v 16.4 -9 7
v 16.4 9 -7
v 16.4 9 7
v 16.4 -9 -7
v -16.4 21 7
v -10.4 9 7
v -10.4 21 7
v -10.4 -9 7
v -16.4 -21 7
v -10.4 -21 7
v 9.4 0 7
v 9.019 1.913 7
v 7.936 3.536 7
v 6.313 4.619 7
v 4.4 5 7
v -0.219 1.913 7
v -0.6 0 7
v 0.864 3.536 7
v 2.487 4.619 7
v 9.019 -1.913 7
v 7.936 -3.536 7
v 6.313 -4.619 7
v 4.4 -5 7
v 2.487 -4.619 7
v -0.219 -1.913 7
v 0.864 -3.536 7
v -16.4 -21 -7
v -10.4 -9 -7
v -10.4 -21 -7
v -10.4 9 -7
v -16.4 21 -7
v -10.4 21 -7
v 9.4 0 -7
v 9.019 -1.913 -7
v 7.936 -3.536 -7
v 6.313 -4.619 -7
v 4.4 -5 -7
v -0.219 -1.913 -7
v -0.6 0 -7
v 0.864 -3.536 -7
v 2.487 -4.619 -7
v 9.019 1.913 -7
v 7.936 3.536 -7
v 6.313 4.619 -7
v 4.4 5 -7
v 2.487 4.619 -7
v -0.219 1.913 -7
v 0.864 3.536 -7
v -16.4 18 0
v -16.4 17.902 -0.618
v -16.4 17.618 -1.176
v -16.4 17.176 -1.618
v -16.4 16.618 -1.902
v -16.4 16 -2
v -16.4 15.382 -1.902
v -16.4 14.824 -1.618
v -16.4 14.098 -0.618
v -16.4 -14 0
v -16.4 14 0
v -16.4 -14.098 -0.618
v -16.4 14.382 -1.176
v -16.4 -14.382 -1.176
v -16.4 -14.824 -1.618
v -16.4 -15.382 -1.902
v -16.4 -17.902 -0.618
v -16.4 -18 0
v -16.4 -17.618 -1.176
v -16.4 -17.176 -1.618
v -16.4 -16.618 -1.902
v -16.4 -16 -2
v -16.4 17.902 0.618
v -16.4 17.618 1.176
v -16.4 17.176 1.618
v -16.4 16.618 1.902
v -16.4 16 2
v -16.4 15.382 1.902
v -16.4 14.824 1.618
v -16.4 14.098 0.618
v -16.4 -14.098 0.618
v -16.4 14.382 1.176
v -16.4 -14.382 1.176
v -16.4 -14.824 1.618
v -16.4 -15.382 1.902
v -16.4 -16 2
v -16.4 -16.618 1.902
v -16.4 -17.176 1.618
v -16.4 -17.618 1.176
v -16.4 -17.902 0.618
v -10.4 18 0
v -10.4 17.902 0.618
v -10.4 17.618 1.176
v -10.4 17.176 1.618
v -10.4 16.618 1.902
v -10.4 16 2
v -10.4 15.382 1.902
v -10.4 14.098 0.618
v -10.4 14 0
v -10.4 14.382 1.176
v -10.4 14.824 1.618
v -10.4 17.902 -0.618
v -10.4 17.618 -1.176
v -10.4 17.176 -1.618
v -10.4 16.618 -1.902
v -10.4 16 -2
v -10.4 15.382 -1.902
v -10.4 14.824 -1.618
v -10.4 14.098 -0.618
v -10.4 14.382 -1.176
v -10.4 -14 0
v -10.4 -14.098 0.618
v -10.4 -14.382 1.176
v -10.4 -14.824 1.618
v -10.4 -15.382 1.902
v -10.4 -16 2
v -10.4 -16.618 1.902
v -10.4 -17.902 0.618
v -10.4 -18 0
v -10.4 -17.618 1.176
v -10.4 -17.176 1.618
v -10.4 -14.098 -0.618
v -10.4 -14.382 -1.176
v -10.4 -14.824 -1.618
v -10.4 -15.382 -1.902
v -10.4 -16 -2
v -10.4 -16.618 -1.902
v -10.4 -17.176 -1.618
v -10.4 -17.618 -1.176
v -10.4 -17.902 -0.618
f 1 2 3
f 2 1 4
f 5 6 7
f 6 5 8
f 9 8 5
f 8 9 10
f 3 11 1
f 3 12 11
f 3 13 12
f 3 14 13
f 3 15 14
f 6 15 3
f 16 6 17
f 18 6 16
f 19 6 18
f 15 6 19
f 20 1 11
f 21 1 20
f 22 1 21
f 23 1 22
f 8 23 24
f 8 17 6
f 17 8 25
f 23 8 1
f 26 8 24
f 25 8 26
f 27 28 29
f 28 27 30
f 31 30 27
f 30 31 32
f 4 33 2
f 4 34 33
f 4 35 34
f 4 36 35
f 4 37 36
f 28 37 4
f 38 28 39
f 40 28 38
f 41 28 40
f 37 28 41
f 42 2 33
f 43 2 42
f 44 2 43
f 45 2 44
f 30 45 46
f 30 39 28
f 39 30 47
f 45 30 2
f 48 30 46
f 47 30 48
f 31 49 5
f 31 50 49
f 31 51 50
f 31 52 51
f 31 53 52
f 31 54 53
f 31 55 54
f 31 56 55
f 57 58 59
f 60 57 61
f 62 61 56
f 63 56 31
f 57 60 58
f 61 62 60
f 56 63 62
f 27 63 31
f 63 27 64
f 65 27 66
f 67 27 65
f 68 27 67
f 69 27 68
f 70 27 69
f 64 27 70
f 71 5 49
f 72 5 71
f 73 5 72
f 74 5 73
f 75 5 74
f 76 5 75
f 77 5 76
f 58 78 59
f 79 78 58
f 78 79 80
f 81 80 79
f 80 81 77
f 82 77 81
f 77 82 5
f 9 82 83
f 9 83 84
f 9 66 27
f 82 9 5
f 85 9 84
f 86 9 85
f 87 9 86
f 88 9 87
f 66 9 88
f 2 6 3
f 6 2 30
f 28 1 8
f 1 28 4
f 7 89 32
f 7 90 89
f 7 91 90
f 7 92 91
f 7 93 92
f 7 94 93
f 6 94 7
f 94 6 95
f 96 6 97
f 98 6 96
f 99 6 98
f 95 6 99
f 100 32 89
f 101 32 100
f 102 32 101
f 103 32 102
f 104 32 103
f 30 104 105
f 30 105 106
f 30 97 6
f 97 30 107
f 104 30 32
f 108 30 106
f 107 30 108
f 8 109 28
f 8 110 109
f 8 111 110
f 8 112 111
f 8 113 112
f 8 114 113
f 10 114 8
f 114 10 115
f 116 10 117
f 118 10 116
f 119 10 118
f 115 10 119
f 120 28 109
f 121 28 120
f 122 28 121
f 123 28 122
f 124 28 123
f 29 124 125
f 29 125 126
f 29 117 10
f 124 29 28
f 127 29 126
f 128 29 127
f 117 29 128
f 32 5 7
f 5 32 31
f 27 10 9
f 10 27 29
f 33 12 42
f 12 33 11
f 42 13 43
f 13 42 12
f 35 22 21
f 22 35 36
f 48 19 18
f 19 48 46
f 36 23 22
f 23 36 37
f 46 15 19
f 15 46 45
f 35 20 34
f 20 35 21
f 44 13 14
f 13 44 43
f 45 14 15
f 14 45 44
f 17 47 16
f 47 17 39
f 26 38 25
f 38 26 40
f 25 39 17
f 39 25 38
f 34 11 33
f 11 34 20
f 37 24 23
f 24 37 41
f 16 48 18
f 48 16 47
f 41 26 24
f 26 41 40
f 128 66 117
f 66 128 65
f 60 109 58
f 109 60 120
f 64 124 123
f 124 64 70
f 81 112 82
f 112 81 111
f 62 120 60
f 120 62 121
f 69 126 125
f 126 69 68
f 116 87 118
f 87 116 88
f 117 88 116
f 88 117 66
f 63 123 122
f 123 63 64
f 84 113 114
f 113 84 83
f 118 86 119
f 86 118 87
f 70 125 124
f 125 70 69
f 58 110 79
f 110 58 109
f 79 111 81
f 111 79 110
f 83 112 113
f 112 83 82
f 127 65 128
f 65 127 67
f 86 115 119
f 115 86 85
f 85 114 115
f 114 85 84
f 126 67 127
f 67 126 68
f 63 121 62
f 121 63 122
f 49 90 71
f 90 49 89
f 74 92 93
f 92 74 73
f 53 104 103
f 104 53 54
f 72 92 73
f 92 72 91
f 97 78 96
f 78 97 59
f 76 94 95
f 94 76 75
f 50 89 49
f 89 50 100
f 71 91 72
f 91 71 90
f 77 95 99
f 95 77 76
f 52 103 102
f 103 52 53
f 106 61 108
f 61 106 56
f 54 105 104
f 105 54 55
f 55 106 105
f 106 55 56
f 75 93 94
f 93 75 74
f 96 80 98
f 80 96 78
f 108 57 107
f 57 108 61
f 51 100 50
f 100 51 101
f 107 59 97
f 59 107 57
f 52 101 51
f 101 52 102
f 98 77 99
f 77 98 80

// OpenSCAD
module sc10uu() {
  difference() {
    cube ([40, 35, 26]);
    translate([20, 36, 13]) rotate(a=90, v=[1,0,0]) cylinder(r=5, h=37);
    translate([-1, -1, 21]) cube ([11, 37, 6]);
    translate([30, -1, 21]) cube ([11, 37, 6]);
    translate([3, 36, 28]) rotate (a = 45, v = [0, 1,0]) rotate (a = 90, v =[1,0,0]) cube ([10, 10, 37]);
    translate([23, 36, 28]) rotate (a = 45, v = [0, 1,0]) rotate (a = 90, v =[1,0,0]) cube ([10, 10, 37]);
  }
}

module sc10luu() {
  difference() {
    cube ([40, 68, 26]);
    translate([20, 69, 13]) rotate(a=90, v=[1,0,0]) cylinder(r=5, h=70);
    translate([-1, -1, 21]) cube ([11, 70, 6]);
    translate([30, -1, 21]) cube ([11, 70, 6]);
    translate([3, 69, 28]) rotate (a = 45, v = [0, 1,0]) rotate (a = 90, v =[1,0,0]) cube ([10, 10, 70]);
    translate([23, 69, 28]) rotate (a = 45, v = [0, 1,0]) rotate (a = 90, v =[1,0,0]) cube ([10, 10, 70]);
  }
}

module wcs10(length) {
  cylinder($fn = 30, r = 5, h = length);
}

module sh10(){
  difference() {
    union() {
      cube([32.8, 18, 14], center=true); //base
      translate([-13.4, 0, 0]) cube([6, 42, 14], center=true); //основание
    }

    translate([4.4, 0, 0]) cylinder(r=5, h=16, center=true);
    translate([-13.4, -16, 0]) rotate (a=90, v=[0, 1,0]) cylinder($fn = 20, r=2, h=8, center=true);
    translate([-13.4, 16, 0]) rotate (a=90, v=[0, 1,0]) cylinder($fn = 20, r=2, h=8, center=true);
  }

}

/*sc10luu();*/

/*wcs10(50);*/
sh10();
